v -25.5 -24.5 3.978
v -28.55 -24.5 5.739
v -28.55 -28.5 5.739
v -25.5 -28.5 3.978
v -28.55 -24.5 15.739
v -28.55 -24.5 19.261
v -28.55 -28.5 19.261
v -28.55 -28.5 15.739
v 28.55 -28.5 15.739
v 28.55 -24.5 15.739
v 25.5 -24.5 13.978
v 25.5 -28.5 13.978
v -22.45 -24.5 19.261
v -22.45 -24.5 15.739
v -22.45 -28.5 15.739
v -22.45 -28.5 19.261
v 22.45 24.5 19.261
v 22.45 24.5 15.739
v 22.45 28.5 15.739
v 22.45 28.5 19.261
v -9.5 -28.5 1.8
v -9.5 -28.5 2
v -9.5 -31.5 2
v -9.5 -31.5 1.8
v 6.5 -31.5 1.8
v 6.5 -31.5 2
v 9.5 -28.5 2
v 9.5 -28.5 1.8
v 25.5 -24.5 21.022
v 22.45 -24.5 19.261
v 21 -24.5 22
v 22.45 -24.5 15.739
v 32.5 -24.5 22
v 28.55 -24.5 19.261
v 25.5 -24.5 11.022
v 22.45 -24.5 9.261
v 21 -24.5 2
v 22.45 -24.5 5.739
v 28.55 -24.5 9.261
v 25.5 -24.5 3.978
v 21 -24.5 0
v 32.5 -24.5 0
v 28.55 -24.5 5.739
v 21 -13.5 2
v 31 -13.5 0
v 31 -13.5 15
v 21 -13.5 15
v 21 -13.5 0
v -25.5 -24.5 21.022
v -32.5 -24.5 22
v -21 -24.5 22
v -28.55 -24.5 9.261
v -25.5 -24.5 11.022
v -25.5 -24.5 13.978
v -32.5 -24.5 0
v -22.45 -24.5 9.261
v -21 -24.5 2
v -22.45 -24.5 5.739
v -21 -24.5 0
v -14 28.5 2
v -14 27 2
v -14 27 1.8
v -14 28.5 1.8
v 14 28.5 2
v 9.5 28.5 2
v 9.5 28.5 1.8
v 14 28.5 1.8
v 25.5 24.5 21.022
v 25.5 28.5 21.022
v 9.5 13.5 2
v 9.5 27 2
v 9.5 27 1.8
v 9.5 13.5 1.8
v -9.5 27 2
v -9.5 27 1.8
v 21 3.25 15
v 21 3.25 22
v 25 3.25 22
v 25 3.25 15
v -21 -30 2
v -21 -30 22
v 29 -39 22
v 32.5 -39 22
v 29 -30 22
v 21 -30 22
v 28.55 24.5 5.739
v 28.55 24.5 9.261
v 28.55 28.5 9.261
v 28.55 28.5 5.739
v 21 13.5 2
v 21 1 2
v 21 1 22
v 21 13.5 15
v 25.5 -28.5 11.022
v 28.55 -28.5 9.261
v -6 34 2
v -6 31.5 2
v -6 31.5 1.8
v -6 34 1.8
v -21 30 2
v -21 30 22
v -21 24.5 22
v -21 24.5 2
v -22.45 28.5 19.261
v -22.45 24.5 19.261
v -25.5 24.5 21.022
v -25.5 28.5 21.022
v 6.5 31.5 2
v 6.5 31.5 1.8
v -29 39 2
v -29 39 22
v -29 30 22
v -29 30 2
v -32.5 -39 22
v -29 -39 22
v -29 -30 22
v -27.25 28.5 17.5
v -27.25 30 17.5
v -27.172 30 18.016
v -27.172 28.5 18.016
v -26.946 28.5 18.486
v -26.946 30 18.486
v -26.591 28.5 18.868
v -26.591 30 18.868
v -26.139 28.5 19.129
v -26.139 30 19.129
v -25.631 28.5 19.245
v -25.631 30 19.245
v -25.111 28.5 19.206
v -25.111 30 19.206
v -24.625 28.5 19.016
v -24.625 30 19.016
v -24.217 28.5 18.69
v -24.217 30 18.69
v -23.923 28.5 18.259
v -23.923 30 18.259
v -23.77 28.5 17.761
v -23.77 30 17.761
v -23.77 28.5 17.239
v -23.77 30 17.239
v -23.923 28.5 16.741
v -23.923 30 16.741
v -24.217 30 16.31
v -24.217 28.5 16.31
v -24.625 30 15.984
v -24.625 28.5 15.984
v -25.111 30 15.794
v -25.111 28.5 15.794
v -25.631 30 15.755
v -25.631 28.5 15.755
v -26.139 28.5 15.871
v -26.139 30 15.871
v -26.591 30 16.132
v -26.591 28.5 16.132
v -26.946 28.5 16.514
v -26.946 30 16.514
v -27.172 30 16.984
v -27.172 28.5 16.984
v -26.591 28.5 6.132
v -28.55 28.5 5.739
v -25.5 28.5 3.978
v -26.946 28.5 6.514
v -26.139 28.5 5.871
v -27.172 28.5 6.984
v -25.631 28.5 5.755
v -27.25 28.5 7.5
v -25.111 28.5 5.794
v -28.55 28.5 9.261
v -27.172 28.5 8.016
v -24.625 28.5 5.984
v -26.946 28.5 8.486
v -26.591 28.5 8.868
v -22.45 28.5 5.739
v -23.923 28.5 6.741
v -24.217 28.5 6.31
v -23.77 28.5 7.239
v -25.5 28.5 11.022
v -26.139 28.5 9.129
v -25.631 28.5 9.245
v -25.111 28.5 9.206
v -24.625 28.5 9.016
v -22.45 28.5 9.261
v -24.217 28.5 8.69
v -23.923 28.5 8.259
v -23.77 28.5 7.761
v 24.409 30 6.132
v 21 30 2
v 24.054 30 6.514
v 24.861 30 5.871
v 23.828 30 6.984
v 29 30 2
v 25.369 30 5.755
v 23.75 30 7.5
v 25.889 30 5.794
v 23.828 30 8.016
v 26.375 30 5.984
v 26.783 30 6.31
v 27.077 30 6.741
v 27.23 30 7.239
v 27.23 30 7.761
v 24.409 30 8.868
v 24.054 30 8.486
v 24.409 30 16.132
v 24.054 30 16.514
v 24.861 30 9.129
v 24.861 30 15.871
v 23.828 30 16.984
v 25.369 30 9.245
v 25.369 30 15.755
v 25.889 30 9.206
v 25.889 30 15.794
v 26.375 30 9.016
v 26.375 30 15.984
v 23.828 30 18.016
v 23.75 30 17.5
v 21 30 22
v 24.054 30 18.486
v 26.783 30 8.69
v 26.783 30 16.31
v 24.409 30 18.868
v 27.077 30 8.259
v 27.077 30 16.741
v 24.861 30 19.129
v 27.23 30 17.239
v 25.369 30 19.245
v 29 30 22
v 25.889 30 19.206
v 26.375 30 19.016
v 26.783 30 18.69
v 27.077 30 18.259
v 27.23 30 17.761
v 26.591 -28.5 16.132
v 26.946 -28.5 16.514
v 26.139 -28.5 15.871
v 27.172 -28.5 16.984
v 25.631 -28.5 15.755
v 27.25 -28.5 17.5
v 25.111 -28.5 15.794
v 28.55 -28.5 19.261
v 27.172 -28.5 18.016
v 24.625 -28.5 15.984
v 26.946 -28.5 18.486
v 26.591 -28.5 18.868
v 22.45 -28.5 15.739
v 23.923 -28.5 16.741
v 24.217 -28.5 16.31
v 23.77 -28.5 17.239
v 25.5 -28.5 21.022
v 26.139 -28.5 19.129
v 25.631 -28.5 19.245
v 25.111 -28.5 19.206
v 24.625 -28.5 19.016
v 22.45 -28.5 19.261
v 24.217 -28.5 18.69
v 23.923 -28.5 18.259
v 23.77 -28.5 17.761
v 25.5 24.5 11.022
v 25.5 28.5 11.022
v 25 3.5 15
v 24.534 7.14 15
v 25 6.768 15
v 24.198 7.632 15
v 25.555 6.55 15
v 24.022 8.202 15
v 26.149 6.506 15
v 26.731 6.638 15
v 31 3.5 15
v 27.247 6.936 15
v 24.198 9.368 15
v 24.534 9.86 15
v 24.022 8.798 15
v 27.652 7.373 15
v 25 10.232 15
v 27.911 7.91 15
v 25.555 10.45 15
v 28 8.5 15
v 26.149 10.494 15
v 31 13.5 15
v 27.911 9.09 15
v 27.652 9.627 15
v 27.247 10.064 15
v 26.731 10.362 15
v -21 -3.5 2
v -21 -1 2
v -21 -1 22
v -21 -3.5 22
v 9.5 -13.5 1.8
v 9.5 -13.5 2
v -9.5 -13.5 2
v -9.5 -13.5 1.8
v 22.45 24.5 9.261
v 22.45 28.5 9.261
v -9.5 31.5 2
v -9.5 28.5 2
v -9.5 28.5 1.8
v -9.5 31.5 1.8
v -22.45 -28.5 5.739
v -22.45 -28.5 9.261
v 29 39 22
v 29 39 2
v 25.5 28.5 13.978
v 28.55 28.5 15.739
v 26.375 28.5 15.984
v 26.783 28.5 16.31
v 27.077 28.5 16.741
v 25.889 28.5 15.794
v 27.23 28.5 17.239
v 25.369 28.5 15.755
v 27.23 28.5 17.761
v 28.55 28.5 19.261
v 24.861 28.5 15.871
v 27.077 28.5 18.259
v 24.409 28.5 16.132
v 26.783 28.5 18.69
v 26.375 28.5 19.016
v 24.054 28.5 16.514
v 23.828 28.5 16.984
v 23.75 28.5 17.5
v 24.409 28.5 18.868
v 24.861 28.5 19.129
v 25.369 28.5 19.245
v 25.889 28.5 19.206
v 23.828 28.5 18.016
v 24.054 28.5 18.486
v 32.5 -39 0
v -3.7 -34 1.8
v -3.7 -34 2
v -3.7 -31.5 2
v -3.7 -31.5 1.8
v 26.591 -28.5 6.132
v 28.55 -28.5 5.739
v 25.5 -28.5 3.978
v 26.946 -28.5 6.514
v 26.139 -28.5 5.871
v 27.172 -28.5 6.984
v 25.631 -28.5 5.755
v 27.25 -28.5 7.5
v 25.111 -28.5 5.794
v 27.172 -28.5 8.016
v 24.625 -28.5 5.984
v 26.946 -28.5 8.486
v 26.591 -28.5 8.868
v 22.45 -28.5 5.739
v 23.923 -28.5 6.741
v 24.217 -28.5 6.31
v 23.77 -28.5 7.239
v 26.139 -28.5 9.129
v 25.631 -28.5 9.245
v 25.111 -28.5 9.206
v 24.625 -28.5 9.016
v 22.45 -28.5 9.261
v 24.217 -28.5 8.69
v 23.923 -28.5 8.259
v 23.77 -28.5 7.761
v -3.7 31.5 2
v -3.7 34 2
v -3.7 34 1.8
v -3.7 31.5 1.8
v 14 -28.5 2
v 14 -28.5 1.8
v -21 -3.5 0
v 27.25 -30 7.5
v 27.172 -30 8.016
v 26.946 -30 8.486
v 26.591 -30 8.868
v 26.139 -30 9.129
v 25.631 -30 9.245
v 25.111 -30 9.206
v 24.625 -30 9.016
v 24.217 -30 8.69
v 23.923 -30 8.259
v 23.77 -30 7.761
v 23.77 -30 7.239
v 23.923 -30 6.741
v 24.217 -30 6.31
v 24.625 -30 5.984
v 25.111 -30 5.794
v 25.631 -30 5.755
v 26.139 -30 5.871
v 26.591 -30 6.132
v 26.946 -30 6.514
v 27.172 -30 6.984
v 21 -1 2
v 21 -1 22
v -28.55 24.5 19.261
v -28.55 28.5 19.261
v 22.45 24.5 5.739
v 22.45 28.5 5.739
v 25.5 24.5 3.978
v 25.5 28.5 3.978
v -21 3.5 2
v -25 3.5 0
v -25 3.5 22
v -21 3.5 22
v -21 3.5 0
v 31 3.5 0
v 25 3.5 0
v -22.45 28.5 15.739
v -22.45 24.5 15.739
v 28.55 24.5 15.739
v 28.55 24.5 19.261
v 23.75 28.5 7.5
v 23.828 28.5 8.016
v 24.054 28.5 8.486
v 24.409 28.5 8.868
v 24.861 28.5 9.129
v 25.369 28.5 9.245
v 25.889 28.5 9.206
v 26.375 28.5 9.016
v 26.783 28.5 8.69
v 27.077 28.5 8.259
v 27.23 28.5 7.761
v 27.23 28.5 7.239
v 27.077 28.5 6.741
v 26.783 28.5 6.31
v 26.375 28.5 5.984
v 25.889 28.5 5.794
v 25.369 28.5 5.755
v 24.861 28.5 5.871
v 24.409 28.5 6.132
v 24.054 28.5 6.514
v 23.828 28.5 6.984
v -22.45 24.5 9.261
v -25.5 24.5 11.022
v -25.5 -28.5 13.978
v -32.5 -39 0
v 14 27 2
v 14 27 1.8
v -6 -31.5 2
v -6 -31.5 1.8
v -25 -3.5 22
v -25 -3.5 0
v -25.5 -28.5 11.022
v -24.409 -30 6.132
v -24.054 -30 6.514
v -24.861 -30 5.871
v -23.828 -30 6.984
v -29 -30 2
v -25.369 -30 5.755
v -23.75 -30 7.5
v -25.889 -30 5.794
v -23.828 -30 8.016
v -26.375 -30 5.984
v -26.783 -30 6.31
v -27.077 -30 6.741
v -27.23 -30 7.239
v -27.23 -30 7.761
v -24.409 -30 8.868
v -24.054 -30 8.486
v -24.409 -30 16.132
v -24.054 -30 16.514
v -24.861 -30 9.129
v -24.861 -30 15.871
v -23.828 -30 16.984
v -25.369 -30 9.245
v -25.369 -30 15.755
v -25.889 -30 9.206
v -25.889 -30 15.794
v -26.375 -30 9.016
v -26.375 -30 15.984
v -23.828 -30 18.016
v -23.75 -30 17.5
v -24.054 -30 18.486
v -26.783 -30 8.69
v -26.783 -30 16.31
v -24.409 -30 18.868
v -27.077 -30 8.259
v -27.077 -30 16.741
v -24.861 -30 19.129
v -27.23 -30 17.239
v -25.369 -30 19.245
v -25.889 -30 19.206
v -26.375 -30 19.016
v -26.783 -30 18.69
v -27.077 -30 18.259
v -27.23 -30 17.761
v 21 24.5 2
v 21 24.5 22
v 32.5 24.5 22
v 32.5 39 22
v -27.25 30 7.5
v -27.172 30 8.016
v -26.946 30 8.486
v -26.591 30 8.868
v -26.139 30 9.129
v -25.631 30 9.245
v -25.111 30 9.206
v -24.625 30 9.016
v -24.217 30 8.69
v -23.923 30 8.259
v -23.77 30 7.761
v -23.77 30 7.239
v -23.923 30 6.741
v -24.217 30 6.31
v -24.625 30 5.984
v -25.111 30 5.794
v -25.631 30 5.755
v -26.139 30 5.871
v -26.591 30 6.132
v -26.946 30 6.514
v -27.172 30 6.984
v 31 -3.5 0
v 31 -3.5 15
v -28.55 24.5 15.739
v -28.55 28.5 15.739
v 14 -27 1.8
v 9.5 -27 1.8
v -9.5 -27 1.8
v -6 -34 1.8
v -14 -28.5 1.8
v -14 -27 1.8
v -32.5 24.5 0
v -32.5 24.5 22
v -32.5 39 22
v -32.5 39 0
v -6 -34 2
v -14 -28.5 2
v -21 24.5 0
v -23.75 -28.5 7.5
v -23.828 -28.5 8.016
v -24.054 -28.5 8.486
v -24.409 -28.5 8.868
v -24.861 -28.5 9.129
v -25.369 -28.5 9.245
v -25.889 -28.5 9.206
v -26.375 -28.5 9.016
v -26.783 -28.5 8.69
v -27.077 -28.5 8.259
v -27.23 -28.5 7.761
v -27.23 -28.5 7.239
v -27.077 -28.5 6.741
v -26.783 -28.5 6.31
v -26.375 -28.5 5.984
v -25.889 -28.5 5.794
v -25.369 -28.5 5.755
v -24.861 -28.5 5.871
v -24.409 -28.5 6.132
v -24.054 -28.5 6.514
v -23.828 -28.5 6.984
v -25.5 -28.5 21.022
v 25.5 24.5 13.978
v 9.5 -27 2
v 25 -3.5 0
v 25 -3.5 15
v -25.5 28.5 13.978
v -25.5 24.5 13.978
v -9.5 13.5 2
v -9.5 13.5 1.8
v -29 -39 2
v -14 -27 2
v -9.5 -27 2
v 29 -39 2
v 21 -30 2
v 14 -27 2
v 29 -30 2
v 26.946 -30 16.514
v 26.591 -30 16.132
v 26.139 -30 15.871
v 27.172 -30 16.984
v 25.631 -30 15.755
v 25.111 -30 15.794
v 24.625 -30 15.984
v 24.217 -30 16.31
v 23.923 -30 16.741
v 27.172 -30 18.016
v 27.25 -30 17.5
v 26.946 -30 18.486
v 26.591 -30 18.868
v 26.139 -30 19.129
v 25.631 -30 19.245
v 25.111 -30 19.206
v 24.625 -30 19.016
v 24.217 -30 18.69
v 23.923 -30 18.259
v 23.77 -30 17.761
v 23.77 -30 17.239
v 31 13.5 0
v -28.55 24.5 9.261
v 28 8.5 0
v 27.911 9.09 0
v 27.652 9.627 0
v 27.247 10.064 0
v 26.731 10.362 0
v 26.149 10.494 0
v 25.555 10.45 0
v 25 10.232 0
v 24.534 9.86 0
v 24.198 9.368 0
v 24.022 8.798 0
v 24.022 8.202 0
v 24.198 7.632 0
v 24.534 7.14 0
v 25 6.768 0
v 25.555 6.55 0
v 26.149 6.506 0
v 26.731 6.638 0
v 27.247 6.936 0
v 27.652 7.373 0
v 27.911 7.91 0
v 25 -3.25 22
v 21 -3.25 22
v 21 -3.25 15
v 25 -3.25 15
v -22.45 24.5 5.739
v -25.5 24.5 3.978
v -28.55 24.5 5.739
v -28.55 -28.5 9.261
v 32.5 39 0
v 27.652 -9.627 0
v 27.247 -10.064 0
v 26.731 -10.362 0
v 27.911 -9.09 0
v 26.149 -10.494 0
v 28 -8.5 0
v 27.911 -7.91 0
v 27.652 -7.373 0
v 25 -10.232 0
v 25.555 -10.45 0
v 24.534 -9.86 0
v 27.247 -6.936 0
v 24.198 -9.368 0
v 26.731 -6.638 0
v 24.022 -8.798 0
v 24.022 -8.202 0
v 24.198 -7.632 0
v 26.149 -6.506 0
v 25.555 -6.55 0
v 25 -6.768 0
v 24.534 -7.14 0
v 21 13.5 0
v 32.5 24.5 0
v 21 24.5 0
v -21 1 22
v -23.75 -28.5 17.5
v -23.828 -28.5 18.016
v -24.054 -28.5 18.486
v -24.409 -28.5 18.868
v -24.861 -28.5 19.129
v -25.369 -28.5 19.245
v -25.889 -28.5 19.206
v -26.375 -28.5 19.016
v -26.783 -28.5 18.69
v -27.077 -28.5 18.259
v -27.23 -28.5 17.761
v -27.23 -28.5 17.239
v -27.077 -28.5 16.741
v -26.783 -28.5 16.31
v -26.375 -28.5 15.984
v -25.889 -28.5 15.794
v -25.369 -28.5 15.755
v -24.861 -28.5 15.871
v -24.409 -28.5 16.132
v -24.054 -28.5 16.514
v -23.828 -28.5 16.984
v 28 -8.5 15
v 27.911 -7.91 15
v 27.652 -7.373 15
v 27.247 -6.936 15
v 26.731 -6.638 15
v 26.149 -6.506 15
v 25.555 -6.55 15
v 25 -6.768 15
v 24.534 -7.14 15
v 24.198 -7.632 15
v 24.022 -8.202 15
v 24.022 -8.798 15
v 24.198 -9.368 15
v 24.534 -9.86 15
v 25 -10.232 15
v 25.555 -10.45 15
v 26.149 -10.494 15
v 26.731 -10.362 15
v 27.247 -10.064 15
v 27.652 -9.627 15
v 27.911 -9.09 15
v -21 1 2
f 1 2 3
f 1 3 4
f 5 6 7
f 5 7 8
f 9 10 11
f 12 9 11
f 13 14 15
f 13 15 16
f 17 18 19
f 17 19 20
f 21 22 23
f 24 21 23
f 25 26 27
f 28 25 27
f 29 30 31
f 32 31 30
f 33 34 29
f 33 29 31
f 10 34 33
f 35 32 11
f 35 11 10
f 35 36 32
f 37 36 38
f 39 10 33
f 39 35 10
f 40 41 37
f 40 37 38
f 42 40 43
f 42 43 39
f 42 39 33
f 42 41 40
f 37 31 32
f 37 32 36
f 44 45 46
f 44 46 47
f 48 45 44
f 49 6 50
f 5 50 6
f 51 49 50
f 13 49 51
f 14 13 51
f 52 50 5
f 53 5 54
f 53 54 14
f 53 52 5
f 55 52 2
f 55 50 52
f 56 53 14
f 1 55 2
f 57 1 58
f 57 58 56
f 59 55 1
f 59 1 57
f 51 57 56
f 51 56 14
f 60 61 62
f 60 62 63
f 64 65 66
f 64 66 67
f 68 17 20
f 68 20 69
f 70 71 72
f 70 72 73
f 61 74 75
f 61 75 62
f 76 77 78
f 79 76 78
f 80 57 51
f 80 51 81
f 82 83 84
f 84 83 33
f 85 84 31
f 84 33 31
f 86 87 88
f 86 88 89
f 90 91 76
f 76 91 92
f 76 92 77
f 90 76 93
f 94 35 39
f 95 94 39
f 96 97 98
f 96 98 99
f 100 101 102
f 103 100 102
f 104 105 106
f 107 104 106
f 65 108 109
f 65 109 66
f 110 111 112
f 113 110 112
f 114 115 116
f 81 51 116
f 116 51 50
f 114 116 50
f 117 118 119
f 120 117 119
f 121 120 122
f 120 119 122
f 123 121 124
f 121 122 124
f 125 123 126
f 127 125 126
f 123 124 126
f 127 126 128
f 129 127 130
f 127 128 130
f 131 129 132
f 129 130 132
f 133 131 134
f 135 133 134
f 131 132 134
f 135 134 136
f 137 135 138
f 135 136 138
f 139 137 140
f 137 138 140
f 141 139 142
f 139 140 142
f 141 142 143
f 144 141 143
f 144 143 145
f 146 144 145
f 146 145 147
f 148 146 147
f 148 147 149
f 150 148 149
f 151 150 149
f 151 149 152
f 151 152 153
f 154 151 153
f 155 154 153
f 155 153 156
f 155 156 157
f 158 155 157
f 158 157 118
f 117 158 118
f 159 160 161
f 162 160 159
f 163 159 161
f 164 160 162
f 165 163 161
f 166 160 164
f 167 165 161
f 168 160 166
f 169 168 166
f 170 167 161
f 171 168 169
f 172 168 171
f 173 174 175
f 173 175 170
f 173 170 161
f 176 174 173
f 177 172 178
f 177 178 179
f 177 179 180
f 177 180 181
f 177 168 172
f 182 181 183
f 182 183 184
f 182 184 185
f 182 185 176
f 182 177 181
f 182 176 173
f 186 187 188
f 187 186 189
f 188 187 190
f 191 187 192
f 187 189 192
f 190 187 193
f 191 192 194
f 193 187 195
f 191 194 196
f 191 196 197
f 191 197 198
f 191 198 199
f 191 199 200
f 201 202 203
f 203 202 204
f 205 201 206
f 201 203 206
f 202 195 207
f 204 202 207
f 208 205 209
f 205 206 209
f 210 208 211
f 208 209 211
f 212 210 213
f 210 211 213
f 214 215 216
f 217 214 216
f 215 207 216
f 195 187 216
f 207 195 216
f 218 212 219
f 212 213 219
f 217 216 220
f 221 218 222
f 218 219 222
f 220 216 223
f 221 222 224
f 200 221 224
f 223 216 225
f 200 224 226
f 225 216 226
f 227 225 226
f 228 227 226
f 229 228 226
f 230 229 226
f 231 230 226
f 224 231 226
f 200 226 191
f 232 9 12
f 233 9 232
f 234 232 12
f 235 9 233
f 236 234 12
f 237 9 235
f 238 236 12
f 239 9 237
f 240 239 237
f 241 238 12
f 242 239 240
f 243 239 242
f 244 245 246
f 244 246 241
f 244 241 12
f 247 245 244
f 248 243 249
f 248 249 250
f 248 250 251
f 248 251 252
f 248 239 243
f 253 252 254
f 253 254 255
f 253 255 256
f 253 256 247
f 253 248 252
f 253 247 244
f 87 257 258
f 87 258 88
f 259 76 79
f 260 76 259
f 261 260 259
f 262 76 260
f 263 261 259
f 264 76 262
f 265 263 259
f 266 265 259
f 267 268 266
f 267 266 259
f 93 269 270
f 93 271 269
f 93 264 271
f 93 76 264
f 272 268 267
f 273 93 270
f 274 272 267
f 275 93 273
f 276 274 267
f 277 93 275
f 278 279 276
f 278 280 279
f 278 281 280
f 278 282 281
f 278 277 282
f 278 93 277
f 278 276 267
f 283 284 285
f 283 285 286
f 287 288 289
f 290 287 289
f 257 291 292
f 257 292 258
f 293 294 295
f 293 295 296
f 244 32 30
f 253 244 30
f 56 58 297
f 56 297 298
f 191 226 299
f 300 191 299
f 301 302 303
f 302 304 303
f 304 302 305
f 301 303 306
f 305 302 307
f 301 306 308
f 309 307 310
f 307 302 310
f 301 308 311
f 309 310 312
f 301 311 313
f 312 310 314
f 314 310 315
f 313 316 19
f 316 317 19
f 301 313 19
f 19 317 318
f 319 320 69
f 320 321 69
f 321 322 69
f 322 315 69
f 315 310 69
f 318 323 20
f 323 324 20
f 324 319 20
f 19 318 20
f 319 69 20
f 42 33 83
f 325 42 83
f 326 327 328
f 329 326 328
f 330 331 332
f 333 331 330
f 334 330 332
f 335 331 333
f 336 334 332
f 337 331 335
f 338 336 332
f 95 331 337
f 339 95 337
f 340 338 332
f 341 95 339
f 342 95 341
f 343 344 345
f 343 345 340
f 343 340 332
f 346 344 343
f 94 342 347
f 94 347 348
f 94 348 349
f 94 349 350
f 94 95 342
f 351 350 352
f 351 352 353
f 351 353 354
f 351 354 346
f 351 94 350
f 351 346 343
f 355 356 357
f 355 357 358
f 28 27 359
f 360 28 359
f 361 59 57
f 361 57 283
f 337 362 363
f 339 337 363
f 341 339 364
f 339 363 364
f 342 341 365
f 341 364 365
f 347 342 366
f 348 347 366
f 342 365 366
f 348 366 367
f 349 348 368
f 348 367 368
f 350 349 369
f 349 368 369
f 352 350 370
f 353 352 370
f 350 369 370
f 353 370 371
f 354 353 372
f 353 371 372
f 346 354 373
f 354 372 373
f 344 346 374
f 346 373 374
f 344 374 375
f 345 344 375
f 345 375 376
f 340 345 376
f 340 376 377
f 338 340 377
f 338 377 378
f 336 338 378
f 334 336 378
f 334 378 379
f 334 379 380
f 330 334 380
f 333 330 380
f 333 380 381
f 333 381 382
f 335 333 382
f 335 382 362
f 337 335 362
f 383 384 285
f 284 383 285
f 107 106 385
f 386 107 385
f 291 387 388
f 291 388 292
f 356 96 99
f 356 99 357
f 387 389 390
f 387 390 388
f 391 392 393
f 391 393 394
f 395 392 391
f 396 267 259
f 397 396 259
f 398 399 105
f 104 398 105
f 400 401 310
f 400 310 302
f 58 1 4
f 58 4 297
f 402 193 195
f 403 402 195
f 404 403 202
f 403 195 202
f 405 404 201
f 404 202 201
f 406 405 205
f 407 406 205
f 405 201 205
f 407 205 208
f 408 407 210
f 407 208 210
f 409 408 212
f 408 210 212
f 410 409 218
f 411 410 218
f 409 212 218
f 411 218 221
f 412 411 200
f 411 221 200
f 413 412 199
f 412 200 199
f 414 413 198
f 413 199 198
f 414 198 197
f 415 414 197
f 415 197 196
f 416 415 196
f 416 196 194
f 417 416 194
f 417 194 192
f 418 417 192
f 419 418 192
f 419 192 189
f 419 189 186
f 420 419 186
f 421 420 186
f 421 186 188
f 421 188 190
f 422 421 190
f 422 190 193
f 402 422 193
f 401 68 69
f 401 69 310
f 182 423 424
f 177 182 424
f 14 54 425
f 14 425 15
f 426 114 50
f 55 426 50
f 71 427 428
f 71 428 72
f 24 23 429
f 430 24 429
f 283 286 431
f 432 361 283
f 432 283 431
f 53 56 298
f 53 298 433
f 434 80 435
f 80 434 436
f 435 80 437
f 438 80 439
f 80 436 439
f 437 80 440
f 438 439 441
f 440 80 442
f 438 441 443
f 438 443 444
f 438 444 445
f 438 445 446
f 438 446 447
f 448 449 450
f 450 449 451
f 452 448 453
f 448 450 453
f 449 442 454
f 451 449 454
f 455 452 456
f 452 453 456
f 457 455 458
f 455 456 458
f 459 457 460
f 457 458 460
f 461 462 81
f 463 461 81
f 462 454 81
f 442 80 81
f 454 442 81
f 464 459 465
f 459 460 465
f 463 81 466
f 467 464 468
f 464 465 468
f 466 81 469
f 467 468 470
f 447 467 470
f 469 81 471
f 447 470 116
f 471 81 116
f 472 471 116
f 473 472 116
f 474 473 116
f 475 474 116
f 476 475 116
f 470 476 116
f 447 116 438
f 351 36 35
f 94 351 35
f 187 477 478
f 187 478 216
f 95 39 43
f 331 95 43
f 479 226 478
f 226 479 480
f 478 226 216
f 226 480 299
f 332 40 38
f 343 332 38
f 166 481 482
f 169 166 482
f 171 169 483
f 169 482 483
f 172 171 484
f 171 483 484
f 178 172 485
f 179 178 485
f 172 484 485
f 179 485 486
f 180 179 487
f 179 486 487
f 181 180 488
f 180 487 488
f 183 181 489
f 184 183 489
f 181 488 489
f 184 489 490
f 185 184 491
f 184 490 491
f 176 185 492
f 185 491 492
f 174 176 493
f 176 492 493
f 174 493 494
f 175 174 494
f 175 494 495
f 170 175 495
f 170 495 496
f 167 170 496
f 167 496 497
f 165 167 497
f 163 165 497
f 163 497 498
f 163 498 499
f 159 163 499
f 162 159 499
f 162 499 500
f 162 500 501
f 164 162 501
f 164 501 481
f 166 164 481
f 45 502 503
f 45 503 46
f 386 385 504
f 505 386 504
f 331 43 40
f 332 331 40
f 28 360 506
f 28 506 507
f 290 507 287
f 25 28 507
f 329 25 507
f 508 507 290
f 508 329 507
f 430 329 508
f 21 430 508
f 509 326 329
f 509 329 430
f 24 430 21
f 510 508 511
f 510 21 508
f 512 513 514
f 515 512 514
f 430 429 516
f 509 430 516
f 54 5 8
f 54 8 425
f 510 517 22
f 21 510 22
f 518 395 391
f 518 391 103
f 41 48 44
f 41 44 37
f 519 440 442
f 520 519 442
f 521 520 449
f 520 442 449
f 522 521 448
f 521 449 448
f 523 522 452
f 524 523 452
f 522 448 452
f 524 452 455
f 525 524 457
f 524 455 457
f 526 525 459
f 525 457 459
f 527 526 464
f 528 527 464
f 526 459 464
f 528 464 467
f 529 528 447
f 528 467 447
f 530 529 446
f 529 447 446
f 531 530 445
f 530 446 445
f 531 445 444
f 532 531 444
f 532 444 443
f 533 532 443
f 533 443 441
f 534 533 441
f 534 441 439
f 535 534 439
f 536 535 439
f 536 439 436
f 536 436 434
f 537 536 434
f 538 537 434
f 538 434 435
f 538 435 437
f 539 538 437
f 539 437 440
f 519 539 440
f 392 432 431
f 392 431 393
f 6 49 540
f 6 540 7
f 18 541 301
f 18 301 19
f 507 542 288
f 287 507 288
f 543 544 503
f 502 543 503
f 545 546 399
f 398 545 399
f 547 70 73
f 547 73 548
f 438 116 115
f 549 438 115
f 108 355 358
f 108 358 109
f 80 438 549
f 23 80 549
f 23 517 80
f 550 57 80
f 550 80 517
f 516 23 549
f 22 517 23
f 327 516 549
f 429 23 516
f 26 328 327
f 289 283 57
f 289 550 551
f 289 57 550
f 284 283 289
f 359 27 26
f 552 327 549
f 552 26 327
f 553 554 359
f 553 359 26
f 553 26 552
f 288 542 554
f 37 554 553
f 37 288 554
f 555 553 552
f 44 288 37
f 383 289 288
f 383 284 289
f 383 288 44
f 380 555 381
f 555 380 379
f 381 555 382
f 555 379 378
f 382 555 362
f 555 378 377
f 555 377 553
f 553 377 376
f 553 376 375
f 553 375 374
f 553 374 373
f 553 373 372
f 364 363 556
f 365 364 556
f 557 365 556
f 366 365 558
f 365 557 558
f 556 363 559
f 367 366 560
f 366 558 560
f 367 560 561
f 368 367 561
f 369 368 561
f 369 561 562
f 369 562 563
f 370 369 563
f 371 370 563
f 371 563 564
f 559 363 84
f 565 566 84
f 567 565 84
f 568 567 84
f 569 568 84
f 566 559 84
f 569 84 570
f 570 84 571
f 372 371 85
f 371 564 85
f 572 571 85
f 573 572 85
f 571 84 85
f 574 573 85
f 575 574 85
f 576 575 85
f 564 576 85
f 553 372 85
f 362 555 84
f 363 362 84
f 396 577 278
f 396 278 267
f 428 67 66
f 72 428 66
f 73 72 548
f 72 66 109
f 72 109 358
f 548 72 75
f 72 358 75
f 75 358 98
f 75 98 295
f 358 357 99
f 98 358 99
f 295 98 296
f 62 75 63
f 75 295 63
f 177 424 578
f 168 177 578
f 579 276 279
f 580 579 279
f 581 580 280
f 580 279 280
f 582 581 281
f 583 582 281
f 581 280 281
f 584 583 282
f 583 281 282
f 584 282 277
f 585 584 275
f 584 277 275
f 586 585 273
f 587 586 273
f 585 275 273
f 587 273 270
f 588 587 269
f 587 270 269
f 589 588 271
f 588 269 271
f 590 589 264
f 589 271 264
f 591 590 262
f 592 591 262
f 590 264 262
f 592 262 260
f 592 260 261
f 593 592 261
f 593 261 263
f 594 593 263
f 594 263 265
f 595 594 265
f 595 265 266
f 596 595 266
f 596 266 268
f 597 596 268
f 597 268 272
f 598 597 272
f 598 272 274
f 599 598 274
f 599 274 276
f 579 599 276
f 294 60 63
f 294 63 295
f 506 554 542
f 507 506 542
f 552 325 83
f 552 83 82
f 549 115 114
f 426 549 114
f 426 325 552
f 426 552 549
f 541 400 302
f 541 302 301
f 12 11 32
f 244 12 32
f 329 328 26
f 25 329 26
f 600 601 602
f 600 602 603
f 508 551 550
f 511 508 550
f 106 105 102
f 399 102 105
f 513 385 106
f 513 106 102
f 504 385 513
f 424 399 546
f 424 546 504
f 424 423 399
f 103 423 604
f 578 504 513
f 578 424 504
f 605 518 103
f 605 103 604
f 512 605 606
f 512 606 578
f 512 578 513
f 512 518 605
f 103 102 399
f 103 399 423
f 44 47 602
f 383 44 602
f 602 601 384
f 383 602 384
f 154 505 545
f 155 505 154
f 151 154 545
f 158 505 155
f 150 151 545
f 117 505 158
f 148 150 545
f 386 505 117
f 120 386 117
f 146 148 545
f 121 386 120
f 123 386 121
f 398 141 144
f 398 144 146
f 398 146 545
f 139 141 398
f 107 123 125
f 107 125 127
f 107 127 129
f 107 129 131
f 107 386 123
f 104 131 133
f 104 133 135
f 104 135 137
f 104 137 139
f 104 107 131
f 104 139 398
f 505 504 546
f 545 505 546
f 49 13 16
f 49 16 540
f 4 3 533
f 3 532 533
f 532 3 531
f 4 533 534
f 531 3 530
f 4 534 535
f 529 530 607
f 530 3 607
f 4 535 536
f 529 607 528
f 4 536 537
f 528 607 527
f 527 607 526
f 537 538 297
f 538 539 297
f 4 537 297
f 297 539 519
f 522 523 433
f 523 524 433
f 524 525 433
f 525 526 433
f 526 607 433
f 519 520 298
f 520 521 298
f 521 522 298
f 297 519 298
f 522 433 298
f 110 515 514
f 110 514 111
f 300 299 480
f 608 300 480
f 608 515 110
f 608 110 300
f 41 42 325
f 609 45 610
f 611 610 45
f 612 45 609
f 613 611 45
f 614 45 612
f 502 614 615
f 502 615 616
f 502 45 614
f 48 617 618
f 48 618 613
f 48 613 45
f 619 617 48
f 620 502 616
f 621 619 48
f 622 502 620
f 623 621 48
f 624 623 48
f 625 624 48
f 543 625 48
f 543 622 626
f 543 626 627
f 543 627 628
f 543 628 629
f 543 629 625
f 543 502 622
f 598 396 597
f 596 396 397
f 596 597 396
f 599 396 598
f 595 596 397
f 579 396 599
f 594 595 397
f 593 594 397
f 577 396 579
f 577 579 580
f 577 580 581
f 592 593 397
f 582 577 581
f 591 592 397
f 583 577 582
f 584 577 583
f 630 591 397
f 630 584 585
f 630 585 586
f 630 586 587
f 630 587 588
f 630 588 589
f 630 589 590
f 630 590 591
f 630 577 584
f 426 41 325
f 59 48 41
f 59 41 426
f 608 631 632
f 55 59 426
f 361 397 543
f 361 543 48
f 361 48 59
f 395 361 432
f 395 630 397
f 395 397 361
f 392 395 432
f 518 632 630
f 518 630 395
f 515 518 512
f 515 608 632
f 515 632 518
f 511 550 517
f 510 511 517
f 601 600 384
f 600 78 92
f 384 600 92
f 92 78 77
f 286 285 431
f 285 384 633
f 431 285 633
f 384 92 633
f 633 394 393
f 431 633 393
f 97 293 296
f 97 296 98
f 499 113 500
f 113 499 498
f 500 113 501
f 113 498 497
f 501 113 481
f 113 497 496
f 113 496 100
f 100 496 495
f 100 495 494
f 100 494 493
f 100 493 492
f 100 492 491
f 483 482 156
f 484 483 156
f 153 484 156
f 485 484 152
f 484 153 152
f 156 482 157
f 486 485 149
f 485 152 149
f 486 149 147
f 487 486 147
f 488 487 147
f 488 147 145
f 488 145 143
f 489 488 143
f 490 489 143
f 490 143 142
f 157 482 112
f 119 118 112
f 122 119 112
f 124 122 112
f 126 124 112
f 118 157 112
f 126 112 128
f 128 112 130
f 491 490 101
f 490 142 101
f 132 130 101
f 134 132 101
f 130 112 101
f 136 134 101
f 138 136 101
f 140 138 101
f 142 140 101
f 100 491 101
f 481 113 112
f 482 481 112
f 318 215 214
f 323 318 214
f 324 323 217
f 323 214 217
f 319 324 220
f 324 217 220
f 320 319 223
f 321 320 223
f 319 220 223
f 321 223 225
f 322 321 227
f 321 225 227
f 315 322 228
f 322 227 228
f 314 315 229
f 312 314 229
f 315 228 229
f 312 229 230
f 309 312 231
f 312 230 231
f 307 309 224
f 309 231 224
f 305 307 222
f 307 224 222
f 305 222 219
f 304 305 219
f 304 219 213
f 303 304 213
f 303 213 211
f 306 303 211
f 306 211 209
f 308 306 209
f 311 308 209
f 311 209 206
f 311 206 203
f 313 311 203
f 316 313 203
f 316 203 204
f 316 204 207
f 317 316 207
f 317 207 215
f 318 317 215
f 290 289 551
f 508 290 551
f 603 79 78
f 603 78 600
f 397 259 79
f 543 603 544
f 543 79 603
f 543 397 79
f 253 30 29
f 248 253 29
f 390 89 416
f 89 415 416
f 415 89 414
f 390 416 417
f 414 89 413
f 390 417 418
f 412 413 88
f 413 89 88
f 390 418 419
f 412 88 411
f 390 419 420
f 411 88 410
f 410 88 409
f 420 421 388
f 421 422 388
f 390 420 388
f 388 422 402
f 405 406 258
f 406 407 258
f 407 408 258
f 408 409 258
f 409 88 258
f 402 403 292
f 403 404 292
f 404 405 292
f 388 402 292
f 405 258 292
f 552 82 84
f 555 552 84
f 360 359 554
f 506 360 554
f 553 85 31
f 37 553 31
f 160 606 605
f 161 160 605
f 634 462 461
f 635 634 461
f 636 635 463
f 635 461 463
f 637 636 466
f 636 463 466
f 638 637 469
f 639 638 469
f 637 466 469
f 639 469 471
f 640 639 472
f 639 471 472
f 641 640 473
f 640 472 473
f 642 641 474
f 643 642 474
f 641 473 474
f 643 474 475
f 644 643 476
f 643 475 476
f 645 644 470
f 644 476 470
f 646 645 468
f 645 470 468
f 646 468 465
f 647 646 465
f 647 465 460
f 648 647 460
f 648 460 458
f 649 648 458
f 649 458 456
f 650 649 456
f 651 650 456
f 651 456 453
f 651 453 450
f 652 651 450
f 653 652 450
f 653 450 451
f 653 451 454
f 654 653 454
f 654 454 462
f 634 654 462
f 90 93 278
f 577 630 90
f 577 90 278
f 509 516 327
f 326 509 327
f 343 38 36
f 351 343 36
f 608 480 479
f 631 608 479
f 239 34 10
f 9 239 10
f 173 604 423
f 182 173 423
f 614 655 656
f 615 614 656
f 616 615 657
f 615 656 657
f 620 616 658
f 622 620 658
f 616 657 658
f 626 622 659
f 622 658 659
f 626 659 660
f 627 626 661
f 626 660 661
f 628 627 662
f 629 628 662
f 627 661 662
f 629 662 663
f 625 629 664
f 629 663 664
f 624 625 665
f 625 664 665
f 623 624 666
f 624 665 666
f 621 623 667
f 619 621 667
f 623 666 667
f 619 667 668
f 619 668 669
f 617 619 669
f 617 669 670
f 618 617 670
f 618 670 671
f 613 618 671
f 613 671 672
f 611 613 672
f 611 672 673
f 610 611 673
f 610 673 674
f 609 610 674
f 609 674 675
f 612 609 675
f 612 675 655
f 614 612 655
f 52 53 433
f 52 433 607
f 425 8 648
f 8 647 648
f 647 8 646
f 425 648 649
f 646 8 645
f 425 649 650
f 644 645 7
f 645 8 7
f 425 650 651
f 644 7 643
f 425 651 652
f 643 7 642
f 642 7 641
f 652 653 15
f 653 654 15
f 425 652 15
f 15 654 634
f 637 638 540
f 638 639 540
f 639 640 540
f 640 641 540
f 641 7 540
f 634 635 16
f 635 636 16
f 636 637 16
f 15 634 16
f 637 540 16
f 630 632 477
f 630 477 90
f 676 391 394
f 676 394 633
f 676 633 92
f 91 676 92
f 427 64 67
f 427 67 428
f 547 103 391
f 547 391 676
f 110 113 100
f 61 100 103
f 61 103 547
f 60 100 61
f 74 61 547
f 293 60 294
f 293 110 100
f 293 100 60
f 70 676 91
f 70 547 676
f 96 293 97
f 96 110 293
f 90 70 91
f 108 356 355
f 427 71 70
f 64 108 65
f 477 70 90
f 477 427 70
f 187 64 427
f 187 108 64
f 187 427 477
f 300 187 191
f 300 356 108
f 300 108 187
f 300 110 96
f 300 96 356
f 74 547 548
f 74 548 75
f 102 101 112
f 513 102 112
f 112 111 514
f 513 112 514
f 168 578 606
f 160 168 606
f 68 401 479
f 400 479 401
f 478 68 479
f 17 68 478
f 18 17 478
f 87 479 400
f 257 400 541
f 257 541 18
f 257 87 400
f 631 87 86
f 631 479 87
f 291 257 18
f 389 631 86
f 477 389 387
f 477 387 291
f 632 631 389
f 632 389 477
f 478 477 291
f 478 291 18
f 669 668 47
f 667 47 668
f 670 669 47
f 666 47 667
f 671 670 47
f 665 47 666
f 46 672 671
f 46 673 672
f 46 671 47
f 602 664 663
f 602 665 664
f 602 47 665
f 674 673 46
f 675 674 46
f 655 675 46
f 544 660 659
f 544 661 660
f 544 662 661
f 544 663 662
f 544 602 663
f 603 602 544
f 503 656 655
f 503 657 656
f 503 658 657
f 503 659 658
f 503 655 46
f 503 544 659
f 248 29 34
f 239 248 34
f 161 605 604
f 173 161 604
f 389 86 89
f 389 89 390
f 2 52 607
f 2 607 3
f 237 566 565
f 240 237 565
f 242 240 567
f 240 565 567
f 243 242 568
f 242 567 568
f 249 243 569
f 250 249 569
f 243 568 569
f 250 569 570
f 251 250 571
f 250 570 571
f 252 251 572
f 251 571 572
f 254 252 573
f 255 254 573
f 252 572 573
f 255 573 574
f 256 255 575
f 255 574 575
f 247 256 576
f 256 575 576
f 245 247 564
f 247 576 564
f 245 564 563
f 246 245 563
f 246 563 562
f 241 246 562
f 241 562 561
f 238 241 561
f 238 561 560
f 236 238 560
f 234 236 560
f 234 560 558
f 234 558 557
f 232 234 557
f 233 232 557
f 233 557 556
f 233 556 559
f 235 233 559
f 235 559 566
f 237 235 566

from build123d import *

# Parameters (mm, degrees)
PAD_DEPTH       = 22
POCKET_DEPTH    = 20
SKETCH002_W     = 12
SKETCH002_H     = 12
POCKET001_DEPTH = 7
SKETCH003_R     = 2
POCKET002_DEPTH = 15.001
SKETCH004_R     = 1.75
POCKET003_DEPTH = 6
SKETCH005_R     = 1.75
POCKET004_DEPTH = 6
POCKET005_DEPTH = 4
POCKET006_DEPTH = 4
POCKET007_DEPTH = 0.2


with BuildPart() as part:
    # Sketch → Pad (new body)
    with BuildSketch(Plane.XY):
        Polygon((-32.5, -39), (-32.5, -24.5), (-21, -24.5), (-21, -3.5), (-25, -3.5), (-25, 3.5), (-21, 3.5), (-21, 24.5), (-32.5, 24.5), (-32.5, 39), (32.5, 39), (32.5, 24.5), (21, 24.5), (21, 13.5), (31, 13.5), (31, 3.5), (25, 3.5), (25, -3.5), (31, -3.5), (31, -13.5), (21, -13.5), (21, -24.5), (32.5, -24.5), (32.5, -39), align=None)
    extrude(amount=PAD_DEPTH)

    # Sketch001 → Pocket (cut)
    with BuildSketch(Plane.XY.offset(22)):
        Polygon((-29, 39), (-29, 30), (-21, 30), (-21, 1), (21, 1), (21, 30), (29, 30), (29, 39), align=None)
        Polygon((21, -1), (-21, -1), (-21, -30), (-29, -30), (-29, -39), (29, -39), (29, -30), (21, -30), align=None)
    extrude(amount=-POCKET_DEPTH, mode=Mode.SUBTRACT)

    # Sketch002 → Pocket001 (cut)
    with BuildSketch(Plane.XY.offset(22)):
        with Locations((27, 9.25)):
            Rectangle(SKETCH002_W, SKETCH002_H)
        with Locations((27, -9.25)):
            Rectangle(SKETCH002_W, SKETCH002_H)
    extrude(amount=-POCKET001_DEPTH, mode=Mode.SUBTRACT)

    # Sketch003 → Pocket002 (cut, through all)
    with BuildSketch(Plane.XY.offset(15)):
        with Locations((26, 8.5)):
            Circle(SKETCH003_R)
        with Locations((26, -8.5)):
            Circle(SKETCH003_R)
    extrude(amount=-POCKET002_DEPTH, mode=Mode.SUBTRACT)

    # Sketch004 → Pocket003 (cut)
    with BuildSketch(Plane.XZ.offset(30)):
        with Locations((-25.5, 17.5)):
            Circle(SKETCH004_R)
        with Locations((-25.5, 7.5)):
            Circle(SKETCH004_R)
        with Locations((25.5, 17.5)):
            Circle(SKETCH004_R)
        with Locations((25.5, 7.5)):
            Circle(SKETCH004_R)
    extrude(amount=-POCKET003_DEPTH, mode=Mode.SUBTRACT)

    # Sketch005 → Pocket004 (cut)
    with BuildSketch(Plane(origin=(0, 30, 0), x_dir=(-1, 0, 0), z_dir=(0, 1, 0))):
        with Locations((-25.5, 17.5)):
            Circle(SKETCH005_R)
        with Locations((-25.5, 7.5)):
            Circle(SKETCH005_R)
        with Locations((25.5, 17.5)):
            Circle(SKETCH005_R)
        with Locations((25.5, 7.5)):
            Circle(SKETCH005_R)
    extrude(amount=-POCKET004_DEPTH, mode=Mode.SUBTRACT)

    # Sketch007 → Pocket005 (cut)
    with BuildSketch(Plane.XZ.offset(-24.5)):
        Polygon((-25.5, 21.021837), (-28.55, 19.260918), (-28.55, 15.739082), (-25.5, 13.978163), (-22.45, 15.739082), (-22.45, 19.260918), align=None)
        Polygon((-25.5, 11.021837), (-28.55, 9.260918), (-28.55, 5.739082), (-25.5, 3.978163), (-22.45, 5.739082), (-22.45, 9.260918), align=None)
    pocket005 = extrude(amount=-POCKET005_DEPTH, mode=Mode.SUBTRACT)

    # Mirrored: Pocket005 across Sketch007 V_Axis
    add(pocket005.mirror(Plane(origin=(0, 24.5, 0), x_dir=(0, -1, 0), z_dir=(1, 0, 0))), mode=Mode.SUBTRACT)

    # Sketch006 → Pocket006 (cut)
    with BuildSketch(Plane(origin=(0, -24.5, 0), x_dir=(-1, 0, 0), z_dir=(0, 1, 0))):
        Polygon((-25.5, 21.021837), (-28.55, 19.260918), (-28.55, 15.739082), (-25.5, 13.978163), (-22.45, 15.739082), (-22.45, 19.260918), align=None)
        Polygon((-25.5, 11.021837), (-28.55, 9.260918), (-28.55, 5.739082), (-25.5, 3.978163), (-22.45, 5.739082), (-22.45, 9.260918), align=None)
    pocket006 = extrude(amount=-POCKET006_DEPTH, mode=Mode.SUBTRACT)

    # Mirrored001: Pocket006 across Sketch006 V_Axis
    add(pocket006.mirror(Plane(origin=(0, -24.5, 0), x_dir=(0, 1, 0), z_dir=(-1, 0, 0))), mode=Mode.SUBTRACT)

    # Sketch008 → Pocket007 (cut)
    with BuildSketch(Plane.XY.offset(2)):
        Polygon((9.5, 13.5), (-9.5, 13.5), (-9.5, 27), (-14, 27), (-14, 28.5), (-9.5, 28.5), (-9.5, 31.5), (-6, 31.5), (-6, 34), (-3.7, 34), (-3.7, 31.5), (6.5, 31.5), (9.5, 28.5), (14, 28.5), (14, 27), (9.5, 27), align=None)
    pocket007 = extrude(amount=-POCKET007_DEPTH, mode=Mode.SUBTRACT)

    # Mirrored002: Pocket007 across Sketch008 H_Axis
    add(pocket007.mirror(Plane(origin=(0, 0, 2), x_dir=(0, 0, 1), z_dir=(0, 1, 0))), mode=Mode.SUBTRACT)


solid = part.part
